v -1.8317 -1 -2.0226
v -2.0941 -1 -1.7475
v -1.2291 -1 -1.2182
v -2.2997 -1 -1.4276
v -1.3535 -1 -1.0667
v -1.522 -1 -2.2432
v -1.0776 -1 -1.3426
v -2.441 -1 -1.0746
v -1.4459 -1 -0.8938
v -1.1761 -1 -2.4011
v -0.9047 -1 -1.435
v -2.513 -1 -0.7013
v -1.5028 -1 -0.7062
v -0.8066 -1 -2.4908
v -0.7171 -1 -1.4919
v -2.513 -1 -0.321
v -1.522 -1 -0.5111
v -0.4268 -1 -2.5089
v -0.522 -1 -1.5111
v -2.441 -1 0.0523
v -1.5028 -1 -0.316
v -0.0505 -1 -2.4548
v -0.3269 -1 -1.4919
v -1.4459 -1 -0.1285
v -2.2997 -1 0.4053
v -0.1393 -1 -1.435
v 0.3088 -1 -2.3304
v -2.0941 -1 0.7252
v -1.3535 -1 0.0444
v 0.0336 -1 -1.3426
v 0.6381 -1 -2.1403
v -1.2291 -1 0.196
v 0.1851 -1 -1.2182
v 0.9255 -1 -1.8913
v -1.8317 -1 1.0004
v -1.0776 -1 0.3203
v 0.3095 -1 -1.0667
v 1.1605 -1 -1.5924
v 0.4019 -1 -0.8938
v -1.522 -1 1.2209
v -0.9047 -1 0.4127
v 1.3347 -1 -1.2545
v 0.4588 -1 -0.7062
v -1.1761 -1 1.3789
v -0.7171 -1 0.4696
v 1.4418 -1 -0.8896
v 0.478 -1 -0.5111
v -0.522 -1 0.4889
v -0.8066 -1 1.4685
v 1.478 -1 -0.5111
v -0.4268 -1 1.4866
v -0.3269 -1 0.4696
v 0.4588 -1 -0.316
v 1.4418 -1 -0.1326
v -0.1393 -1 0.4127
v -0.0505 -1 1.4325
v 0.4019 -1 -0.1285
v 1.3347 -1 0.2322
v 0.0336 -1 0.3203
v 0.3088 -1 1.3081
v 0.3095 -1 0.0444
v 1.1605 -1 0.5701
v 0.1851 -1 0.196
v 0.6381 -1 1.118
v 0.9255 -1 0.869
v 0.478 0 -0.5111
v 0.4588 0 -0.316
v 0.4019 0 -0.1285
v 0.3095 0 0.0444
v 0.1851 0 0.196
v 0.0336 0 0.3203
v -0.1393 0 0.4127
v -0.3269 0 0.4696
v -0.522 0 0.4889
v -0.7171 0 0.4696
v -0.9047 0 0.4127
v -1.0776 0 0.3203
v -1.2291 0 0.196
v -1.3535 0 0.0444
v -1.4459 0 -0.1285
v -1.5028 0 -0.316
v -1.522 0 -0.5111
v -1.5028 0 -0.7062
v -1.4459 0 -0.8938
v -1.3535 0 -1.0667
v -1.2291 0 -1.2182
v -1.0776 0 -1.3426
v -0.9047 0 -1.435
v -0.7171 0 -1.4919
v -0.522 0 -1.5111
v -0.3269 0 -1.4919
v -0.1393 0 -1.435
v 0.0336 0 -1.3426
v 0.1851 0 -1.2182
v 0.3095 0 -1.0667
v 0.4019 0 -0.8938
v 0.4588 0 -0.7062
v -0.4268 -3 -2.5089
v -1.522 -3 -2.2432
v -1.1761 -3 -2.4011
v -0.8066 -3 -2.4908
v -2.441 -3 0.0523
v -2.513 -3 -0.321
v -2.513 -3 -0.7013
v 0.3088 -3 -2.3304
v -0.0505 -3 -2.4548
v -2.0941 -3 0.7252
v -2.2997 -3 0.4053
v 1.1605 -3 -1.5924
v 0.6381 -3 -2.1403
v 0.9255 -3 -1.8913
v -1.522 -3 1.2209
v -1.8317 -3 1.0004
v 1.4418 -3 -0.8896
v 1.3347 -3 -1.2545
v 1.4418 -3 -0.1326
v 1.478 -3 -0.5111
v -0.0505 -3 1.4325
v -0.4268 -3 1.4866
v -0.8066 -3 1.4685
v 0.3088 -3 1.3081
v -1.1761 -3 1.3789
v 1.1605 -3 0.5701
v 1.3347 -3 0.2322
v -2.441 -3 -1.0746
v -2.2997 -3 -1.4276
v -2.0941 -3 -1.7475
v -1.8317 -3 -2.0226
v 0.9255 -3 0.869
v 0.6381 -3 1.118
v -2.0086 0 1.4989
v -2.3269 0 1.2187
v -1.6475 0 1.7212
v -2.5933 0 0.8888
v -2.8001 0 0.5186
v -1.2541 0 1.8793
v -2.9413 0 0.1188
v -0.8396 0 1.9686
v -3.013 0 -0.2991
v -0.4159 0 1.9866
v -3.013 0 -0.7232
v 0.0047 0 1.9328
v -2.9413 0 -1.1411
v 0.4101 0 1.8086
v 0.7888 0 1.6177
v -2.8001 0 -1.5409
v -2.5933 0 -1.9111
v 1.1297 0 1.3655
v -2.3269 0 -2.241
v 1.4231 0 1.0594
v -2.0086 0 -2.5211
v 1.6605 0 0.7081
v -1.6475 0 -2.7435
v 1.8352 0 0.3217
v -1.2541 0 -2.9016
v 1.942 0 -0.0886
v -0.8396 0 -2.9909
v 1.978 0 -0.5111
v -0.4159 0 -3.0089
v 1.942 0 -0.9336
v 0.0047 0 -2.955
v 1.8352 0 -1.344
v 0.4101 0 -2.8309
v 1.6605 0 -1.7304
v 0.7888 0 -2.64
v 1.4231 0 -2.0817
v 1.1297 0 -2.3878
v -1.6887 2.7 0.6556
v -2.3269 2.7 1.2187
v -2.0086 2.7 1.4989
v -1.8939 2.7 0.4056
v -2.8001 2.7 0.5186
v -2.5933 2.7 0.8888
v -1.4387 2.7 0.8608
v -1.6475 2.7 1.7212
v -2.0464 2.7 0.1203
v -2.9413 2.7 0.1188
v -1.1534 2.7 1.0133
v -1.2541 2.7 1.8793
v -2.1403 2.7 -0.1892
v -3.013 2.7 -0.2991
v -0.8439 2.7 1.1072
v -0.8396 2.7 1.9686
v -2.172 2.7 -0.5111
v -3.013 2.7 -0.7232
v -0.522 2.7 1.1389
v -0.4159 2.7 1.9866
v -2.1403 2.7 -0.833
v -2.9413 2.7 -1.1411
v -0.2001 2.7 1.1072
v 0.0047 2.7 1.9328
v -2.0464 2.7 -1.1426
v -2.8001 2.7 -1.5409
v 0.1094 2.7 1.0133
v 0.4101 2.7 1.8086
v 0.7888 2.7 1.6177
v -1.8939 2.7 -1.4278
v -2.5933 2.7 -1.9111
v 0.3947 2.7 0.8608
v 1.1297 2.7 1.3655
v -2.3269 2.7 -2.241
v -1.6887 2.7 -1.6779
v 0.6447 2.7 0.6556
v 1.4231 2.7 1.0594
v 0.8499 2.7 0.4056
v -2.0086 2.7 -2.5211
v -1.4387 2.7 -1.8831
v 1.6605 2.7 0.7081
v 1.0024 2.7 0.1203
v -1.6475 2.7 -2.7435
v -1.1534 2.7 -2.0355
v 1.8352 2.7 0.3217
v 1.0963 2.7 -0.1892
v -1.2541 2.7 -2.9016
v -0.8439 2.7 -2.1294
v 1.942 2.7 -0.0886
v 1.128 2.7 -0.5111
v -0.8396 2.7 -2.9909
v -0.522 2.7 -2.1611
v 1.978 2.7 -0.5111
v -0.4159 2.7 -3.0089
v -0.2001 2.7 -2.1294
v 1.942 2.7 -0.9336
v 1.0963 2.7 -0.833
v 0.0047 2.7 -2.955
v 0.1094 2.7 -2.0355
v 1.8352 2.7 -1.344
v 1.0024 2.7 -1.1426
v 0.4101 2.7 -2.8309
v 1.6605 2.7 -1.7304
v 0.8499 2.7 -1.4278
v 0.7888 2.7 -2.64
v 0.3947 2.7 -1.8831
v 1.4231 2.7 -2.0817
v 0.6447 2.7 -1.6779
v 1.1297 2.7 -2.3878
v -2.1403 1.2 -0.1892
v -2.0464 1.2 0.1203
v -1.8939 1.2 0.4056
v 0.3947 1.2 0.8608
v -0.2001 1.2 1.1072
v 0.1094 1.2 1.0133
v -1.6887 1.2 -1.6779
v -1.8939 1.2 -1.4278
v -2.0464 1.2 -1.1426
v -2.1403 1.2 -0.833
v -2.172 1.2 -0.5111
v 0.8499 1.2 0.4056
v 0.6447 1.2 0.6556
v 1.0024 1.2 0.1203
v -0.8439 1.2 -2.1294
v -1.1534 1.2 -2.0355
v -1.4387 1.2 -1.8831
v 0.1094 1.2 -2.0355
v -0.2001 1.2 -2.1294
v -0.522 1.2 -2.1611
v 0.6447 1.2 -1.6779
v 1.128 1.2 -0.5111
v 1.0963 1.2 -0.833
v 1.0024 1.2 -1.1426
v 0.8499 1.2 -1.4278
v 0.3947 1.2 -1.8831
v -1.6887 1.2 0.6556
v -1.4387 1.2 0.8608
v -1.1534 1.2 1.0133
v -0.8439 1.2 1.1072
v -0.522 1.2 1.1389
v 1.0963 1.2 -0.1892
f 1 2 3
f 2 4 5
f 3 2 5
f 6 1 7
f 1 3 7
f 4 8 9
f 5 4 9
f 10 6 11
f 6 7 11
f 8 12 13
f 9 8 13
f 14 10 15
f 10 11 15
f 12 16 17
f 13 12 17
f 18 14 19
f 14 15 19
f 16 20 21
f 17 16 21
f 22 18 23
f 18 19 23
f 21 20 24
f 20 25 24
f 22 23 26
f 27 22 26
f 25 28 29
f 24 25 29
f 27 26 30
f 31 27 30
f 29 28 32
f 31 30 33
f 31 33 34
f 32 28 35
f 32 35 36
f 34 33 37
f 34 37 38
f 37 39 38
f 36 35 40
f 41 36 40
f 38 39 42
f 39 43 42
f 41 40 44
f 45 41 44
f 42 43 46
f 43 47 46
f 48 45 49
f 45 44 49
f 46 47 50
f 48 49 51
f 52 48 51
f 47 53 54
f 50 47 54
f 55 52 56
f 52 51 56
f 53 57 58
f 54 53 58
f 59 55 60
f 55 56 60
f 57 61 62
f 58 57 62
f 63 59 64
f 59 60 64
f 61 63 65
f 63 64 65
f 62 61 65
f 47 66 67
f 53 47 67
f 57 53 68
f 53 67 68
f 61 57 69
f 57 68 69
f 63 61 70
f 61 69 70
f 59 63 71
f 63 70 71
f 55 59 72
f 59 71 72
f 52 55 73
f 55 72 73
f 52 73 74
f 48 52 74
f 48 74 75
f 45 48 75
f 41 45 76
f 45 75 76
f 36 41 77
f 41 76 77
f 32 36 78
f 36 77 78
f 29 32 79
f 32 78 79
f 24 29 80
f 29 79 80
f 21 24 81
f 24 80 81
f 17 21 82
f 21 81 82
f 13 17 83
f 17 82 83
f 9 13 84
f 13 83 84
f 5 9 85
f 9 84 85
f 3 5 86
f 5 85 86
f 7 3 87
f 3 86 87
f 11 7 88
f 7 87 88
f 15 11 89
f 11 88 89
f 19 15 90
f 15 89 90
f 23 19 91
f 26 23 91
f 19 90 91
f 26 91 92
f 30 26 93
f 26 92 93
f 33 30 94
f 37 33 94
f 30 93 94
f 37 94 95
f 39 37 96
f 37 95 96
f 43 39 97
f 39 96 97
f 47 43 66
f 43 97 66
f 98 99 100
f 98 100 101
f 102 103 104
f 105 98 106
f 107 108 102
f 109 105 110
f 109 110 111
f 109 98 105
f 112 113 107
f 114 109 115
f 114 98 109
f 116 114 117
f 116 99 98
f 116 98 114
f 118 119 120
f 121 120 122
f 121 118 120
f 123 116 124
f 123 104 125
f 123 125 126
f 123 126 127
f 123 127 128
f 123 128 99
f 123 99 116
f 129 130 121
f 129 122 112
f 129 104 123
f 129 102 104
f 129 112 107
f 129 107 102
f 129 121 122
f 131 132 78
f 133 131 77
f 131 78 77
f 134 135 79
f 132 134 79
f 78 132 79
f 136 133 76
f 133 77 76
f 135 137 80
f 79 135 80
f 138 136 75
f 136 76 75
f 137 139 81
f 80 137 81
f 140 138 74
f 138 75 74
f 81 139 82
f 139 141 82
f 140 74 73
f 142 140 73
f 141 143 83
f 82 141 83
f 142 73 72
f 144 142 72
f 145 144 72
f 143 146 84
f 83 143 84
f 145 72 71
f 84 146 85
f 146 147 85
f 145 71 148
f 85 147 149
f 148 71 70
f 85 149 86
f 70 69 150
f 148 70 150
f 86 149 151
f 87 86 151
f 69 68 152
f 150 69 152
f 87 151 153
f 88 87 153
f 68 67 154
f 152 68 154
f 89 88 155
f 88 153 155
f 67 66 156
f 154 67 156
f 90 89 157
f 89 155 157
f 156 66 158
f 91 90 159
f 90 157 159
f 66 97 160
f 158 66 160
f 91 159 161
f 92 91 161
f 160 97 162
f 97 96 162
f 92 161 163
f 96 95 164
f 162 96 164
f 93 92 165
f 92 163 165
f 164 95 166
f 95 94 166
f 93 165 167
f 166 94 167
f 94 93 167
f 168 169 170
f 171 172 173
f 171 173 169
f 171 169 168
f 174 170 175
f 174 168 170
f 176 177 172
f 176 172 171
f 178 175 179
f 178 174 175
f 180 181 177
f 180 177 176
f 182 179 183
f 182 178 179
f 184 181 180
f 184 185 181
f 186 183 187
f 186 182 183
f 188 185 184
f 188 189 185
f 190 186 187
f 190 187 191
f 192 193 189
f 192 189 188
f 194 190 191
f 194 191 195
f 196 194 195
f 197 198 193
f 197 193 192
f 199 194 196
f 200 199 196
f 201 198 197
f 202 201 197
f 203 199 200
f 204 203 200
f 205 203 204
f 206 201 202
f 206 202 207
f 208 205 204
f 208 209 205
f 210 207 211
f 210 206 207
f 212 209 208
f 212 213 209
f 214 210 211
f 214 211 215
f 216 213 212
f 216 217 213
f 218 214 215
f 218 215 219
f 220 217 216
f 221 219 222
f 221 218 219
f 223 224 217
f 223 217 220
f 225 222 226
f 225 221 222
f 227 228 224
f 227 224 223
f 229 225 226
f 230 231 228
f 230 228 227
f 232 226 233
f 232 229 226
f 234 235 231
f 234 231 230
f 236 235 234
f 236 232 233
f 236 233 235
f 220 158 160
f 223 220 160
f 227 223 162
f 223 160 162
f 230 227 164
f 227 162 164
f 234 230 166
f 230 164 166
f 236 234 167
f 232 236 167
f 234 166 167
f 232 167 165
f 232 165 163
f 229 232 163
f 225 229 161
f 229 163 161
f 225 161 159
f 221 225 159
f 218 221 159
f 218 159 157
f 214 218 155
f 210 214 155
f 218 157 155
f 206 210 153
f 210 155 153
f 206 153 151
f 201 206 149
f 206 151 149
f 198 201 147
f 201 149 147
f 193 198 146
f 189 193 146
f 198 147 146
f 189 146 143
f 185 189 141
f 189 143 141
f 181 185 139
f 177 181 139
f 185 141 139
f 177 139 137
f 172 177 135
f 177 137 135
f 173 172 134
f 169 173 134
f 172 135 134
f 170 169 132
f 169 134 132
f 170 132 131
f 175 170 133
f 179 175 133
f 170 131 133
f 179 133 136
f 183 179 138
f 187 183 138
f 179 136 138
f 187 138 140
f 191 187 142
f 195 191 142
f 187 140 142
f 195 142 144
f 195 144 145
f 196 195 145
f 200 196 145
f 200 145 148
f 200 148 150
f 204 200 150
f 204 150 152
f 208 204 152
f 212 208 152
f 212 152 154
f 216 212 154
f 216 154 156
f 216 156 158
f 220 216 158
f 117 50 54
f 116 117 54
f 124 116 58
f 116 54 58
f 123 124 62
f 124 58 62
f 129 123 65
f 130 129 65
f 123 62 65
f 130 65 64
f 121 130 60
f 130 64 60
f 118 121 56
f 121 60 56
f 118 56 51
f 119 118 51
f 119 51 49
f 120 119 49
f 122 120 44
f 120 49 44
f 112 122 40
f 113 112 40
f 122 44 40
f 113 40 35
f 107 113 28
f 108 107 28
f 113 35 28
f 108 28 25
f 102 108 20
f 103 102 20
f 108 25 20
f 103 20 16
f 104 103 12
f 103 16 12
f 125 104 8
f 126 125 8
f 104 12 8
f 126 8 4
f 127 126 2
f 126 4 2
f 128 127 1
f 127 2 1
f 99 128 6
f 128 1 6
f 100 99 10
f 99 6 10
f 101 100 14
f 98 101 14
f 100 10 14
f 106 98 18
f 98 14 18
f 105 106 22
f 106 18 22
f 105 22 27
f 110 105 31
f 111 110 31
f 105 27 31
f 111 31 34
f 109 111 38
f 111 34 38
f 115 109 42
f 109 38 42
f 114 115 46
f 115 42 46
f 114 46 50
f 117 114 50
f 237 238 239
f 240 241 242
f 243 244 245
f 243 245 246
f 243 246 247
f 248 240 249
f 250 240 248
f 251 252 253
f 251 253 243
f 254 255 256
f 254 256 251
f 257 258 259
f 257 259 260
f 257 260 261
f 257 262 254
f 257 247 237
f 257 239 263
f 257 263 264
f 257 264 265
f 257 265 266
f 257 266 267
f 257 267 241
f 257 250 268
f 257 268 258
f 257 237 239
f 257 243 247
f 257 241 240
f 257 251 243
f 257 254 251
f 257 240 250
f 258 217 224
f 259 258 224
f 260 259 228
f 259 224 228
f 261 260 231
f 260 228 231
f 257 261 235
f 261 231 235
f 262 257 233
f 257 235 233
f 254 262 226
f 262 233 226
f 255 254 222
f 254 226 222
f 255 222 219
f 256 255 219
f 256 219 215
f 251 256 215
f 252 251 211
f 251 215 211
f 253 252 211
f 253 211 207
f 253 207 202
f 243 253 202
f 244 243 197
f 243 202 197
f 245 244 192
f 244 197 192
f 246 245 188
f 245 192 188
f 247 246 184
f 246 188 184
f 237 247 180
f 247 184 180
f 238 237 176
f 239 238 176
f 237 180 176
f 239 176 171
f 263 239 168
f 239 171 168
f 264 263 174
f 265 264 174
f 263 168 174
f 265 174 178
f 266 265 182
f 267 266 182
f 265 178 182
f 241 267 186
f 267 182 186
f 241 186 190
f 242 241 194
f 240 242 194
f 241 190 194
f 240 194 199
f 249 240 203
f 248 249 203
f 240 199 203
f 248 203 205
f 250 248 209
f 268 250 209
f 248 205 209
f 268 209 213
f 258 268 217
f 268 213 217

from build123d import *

# Parameters (mm, degrees)
SKETCH1_R           = 2.5
BOSS_EXTRUDE1_DEPTH = 2.7
SKETCH1_3_R         = 2
BOSS_EXTRUDE2_DEPTH = 1
SKETCH5_R           = 1
BOSS_EXTRUDE3_DEPTH = 1
SKETCH6_R           = 2
BOSS_EXTRUDE4_DEPTH = 2
SKETCH12_R          = 1.65
CUT_EXTRUDE1_DEPTH  = 1.5


with BuildPart() as part:
    # Sketch1 → Boss-Extrude1 (new body)
    with BuildSketch(Plane(origin=(0, 0, 0), x_dir=(1, 0, 0), z_dir=(0, 1, 0))):
        with Locations((-0.522013312, 0.511138034)):
            Circle(SKETCH1_R)
    extrude(amount=BOSS_EXTRUDE1_DEPTH)

    # Sketch1<3> → Boss-Extrude2 (add)
    with BuildSketch(Plane(origin=(0, 0, 0), x_dir=(1, 0, 0), z_dir=(0, 1, 0))):
        with Locations((-0.522013312, 0.511138034)):
            Circle(SKETCH1_3_R)
    extrude(amount=BOSS_EXTRUDE2_DEPTH)

    # Sketch5 → Boss-Extrude3 (add)
    with BuildSketch(Plane.XZ):
        with Locations((-0.522013312, -0.511138034)):
            Circle(SKETCH5_R)
    extrude(amount=BOSS_EXTRUDE3_DEPTH)

    # Sketch6 → Boss-Extrude4 (add)
    with BuildSketch(Plane.XZ.offset(1)):
        with Locations((-0.522013312, -0.511138034)):
            Circle(SKETCH6_R)
    extrude(amount=BOSS_EXTRUDE4_DEPTH)

    # Sketch12 → Cut-Extrude1 (cut)
    with BuildSketch(Plane(origin=(0, 2.7, 0), x_dir=(1, 0, 0), z_dir=(0, 1, 0))):
        with Locations((-0.522013312, 0.511138034)):
            Circle(SKETCH12_R)
    extrude(amount=-CUT_EXTRUDE1_DEPTH, mode=Mode.SUBTRACT)


solid = part.part
